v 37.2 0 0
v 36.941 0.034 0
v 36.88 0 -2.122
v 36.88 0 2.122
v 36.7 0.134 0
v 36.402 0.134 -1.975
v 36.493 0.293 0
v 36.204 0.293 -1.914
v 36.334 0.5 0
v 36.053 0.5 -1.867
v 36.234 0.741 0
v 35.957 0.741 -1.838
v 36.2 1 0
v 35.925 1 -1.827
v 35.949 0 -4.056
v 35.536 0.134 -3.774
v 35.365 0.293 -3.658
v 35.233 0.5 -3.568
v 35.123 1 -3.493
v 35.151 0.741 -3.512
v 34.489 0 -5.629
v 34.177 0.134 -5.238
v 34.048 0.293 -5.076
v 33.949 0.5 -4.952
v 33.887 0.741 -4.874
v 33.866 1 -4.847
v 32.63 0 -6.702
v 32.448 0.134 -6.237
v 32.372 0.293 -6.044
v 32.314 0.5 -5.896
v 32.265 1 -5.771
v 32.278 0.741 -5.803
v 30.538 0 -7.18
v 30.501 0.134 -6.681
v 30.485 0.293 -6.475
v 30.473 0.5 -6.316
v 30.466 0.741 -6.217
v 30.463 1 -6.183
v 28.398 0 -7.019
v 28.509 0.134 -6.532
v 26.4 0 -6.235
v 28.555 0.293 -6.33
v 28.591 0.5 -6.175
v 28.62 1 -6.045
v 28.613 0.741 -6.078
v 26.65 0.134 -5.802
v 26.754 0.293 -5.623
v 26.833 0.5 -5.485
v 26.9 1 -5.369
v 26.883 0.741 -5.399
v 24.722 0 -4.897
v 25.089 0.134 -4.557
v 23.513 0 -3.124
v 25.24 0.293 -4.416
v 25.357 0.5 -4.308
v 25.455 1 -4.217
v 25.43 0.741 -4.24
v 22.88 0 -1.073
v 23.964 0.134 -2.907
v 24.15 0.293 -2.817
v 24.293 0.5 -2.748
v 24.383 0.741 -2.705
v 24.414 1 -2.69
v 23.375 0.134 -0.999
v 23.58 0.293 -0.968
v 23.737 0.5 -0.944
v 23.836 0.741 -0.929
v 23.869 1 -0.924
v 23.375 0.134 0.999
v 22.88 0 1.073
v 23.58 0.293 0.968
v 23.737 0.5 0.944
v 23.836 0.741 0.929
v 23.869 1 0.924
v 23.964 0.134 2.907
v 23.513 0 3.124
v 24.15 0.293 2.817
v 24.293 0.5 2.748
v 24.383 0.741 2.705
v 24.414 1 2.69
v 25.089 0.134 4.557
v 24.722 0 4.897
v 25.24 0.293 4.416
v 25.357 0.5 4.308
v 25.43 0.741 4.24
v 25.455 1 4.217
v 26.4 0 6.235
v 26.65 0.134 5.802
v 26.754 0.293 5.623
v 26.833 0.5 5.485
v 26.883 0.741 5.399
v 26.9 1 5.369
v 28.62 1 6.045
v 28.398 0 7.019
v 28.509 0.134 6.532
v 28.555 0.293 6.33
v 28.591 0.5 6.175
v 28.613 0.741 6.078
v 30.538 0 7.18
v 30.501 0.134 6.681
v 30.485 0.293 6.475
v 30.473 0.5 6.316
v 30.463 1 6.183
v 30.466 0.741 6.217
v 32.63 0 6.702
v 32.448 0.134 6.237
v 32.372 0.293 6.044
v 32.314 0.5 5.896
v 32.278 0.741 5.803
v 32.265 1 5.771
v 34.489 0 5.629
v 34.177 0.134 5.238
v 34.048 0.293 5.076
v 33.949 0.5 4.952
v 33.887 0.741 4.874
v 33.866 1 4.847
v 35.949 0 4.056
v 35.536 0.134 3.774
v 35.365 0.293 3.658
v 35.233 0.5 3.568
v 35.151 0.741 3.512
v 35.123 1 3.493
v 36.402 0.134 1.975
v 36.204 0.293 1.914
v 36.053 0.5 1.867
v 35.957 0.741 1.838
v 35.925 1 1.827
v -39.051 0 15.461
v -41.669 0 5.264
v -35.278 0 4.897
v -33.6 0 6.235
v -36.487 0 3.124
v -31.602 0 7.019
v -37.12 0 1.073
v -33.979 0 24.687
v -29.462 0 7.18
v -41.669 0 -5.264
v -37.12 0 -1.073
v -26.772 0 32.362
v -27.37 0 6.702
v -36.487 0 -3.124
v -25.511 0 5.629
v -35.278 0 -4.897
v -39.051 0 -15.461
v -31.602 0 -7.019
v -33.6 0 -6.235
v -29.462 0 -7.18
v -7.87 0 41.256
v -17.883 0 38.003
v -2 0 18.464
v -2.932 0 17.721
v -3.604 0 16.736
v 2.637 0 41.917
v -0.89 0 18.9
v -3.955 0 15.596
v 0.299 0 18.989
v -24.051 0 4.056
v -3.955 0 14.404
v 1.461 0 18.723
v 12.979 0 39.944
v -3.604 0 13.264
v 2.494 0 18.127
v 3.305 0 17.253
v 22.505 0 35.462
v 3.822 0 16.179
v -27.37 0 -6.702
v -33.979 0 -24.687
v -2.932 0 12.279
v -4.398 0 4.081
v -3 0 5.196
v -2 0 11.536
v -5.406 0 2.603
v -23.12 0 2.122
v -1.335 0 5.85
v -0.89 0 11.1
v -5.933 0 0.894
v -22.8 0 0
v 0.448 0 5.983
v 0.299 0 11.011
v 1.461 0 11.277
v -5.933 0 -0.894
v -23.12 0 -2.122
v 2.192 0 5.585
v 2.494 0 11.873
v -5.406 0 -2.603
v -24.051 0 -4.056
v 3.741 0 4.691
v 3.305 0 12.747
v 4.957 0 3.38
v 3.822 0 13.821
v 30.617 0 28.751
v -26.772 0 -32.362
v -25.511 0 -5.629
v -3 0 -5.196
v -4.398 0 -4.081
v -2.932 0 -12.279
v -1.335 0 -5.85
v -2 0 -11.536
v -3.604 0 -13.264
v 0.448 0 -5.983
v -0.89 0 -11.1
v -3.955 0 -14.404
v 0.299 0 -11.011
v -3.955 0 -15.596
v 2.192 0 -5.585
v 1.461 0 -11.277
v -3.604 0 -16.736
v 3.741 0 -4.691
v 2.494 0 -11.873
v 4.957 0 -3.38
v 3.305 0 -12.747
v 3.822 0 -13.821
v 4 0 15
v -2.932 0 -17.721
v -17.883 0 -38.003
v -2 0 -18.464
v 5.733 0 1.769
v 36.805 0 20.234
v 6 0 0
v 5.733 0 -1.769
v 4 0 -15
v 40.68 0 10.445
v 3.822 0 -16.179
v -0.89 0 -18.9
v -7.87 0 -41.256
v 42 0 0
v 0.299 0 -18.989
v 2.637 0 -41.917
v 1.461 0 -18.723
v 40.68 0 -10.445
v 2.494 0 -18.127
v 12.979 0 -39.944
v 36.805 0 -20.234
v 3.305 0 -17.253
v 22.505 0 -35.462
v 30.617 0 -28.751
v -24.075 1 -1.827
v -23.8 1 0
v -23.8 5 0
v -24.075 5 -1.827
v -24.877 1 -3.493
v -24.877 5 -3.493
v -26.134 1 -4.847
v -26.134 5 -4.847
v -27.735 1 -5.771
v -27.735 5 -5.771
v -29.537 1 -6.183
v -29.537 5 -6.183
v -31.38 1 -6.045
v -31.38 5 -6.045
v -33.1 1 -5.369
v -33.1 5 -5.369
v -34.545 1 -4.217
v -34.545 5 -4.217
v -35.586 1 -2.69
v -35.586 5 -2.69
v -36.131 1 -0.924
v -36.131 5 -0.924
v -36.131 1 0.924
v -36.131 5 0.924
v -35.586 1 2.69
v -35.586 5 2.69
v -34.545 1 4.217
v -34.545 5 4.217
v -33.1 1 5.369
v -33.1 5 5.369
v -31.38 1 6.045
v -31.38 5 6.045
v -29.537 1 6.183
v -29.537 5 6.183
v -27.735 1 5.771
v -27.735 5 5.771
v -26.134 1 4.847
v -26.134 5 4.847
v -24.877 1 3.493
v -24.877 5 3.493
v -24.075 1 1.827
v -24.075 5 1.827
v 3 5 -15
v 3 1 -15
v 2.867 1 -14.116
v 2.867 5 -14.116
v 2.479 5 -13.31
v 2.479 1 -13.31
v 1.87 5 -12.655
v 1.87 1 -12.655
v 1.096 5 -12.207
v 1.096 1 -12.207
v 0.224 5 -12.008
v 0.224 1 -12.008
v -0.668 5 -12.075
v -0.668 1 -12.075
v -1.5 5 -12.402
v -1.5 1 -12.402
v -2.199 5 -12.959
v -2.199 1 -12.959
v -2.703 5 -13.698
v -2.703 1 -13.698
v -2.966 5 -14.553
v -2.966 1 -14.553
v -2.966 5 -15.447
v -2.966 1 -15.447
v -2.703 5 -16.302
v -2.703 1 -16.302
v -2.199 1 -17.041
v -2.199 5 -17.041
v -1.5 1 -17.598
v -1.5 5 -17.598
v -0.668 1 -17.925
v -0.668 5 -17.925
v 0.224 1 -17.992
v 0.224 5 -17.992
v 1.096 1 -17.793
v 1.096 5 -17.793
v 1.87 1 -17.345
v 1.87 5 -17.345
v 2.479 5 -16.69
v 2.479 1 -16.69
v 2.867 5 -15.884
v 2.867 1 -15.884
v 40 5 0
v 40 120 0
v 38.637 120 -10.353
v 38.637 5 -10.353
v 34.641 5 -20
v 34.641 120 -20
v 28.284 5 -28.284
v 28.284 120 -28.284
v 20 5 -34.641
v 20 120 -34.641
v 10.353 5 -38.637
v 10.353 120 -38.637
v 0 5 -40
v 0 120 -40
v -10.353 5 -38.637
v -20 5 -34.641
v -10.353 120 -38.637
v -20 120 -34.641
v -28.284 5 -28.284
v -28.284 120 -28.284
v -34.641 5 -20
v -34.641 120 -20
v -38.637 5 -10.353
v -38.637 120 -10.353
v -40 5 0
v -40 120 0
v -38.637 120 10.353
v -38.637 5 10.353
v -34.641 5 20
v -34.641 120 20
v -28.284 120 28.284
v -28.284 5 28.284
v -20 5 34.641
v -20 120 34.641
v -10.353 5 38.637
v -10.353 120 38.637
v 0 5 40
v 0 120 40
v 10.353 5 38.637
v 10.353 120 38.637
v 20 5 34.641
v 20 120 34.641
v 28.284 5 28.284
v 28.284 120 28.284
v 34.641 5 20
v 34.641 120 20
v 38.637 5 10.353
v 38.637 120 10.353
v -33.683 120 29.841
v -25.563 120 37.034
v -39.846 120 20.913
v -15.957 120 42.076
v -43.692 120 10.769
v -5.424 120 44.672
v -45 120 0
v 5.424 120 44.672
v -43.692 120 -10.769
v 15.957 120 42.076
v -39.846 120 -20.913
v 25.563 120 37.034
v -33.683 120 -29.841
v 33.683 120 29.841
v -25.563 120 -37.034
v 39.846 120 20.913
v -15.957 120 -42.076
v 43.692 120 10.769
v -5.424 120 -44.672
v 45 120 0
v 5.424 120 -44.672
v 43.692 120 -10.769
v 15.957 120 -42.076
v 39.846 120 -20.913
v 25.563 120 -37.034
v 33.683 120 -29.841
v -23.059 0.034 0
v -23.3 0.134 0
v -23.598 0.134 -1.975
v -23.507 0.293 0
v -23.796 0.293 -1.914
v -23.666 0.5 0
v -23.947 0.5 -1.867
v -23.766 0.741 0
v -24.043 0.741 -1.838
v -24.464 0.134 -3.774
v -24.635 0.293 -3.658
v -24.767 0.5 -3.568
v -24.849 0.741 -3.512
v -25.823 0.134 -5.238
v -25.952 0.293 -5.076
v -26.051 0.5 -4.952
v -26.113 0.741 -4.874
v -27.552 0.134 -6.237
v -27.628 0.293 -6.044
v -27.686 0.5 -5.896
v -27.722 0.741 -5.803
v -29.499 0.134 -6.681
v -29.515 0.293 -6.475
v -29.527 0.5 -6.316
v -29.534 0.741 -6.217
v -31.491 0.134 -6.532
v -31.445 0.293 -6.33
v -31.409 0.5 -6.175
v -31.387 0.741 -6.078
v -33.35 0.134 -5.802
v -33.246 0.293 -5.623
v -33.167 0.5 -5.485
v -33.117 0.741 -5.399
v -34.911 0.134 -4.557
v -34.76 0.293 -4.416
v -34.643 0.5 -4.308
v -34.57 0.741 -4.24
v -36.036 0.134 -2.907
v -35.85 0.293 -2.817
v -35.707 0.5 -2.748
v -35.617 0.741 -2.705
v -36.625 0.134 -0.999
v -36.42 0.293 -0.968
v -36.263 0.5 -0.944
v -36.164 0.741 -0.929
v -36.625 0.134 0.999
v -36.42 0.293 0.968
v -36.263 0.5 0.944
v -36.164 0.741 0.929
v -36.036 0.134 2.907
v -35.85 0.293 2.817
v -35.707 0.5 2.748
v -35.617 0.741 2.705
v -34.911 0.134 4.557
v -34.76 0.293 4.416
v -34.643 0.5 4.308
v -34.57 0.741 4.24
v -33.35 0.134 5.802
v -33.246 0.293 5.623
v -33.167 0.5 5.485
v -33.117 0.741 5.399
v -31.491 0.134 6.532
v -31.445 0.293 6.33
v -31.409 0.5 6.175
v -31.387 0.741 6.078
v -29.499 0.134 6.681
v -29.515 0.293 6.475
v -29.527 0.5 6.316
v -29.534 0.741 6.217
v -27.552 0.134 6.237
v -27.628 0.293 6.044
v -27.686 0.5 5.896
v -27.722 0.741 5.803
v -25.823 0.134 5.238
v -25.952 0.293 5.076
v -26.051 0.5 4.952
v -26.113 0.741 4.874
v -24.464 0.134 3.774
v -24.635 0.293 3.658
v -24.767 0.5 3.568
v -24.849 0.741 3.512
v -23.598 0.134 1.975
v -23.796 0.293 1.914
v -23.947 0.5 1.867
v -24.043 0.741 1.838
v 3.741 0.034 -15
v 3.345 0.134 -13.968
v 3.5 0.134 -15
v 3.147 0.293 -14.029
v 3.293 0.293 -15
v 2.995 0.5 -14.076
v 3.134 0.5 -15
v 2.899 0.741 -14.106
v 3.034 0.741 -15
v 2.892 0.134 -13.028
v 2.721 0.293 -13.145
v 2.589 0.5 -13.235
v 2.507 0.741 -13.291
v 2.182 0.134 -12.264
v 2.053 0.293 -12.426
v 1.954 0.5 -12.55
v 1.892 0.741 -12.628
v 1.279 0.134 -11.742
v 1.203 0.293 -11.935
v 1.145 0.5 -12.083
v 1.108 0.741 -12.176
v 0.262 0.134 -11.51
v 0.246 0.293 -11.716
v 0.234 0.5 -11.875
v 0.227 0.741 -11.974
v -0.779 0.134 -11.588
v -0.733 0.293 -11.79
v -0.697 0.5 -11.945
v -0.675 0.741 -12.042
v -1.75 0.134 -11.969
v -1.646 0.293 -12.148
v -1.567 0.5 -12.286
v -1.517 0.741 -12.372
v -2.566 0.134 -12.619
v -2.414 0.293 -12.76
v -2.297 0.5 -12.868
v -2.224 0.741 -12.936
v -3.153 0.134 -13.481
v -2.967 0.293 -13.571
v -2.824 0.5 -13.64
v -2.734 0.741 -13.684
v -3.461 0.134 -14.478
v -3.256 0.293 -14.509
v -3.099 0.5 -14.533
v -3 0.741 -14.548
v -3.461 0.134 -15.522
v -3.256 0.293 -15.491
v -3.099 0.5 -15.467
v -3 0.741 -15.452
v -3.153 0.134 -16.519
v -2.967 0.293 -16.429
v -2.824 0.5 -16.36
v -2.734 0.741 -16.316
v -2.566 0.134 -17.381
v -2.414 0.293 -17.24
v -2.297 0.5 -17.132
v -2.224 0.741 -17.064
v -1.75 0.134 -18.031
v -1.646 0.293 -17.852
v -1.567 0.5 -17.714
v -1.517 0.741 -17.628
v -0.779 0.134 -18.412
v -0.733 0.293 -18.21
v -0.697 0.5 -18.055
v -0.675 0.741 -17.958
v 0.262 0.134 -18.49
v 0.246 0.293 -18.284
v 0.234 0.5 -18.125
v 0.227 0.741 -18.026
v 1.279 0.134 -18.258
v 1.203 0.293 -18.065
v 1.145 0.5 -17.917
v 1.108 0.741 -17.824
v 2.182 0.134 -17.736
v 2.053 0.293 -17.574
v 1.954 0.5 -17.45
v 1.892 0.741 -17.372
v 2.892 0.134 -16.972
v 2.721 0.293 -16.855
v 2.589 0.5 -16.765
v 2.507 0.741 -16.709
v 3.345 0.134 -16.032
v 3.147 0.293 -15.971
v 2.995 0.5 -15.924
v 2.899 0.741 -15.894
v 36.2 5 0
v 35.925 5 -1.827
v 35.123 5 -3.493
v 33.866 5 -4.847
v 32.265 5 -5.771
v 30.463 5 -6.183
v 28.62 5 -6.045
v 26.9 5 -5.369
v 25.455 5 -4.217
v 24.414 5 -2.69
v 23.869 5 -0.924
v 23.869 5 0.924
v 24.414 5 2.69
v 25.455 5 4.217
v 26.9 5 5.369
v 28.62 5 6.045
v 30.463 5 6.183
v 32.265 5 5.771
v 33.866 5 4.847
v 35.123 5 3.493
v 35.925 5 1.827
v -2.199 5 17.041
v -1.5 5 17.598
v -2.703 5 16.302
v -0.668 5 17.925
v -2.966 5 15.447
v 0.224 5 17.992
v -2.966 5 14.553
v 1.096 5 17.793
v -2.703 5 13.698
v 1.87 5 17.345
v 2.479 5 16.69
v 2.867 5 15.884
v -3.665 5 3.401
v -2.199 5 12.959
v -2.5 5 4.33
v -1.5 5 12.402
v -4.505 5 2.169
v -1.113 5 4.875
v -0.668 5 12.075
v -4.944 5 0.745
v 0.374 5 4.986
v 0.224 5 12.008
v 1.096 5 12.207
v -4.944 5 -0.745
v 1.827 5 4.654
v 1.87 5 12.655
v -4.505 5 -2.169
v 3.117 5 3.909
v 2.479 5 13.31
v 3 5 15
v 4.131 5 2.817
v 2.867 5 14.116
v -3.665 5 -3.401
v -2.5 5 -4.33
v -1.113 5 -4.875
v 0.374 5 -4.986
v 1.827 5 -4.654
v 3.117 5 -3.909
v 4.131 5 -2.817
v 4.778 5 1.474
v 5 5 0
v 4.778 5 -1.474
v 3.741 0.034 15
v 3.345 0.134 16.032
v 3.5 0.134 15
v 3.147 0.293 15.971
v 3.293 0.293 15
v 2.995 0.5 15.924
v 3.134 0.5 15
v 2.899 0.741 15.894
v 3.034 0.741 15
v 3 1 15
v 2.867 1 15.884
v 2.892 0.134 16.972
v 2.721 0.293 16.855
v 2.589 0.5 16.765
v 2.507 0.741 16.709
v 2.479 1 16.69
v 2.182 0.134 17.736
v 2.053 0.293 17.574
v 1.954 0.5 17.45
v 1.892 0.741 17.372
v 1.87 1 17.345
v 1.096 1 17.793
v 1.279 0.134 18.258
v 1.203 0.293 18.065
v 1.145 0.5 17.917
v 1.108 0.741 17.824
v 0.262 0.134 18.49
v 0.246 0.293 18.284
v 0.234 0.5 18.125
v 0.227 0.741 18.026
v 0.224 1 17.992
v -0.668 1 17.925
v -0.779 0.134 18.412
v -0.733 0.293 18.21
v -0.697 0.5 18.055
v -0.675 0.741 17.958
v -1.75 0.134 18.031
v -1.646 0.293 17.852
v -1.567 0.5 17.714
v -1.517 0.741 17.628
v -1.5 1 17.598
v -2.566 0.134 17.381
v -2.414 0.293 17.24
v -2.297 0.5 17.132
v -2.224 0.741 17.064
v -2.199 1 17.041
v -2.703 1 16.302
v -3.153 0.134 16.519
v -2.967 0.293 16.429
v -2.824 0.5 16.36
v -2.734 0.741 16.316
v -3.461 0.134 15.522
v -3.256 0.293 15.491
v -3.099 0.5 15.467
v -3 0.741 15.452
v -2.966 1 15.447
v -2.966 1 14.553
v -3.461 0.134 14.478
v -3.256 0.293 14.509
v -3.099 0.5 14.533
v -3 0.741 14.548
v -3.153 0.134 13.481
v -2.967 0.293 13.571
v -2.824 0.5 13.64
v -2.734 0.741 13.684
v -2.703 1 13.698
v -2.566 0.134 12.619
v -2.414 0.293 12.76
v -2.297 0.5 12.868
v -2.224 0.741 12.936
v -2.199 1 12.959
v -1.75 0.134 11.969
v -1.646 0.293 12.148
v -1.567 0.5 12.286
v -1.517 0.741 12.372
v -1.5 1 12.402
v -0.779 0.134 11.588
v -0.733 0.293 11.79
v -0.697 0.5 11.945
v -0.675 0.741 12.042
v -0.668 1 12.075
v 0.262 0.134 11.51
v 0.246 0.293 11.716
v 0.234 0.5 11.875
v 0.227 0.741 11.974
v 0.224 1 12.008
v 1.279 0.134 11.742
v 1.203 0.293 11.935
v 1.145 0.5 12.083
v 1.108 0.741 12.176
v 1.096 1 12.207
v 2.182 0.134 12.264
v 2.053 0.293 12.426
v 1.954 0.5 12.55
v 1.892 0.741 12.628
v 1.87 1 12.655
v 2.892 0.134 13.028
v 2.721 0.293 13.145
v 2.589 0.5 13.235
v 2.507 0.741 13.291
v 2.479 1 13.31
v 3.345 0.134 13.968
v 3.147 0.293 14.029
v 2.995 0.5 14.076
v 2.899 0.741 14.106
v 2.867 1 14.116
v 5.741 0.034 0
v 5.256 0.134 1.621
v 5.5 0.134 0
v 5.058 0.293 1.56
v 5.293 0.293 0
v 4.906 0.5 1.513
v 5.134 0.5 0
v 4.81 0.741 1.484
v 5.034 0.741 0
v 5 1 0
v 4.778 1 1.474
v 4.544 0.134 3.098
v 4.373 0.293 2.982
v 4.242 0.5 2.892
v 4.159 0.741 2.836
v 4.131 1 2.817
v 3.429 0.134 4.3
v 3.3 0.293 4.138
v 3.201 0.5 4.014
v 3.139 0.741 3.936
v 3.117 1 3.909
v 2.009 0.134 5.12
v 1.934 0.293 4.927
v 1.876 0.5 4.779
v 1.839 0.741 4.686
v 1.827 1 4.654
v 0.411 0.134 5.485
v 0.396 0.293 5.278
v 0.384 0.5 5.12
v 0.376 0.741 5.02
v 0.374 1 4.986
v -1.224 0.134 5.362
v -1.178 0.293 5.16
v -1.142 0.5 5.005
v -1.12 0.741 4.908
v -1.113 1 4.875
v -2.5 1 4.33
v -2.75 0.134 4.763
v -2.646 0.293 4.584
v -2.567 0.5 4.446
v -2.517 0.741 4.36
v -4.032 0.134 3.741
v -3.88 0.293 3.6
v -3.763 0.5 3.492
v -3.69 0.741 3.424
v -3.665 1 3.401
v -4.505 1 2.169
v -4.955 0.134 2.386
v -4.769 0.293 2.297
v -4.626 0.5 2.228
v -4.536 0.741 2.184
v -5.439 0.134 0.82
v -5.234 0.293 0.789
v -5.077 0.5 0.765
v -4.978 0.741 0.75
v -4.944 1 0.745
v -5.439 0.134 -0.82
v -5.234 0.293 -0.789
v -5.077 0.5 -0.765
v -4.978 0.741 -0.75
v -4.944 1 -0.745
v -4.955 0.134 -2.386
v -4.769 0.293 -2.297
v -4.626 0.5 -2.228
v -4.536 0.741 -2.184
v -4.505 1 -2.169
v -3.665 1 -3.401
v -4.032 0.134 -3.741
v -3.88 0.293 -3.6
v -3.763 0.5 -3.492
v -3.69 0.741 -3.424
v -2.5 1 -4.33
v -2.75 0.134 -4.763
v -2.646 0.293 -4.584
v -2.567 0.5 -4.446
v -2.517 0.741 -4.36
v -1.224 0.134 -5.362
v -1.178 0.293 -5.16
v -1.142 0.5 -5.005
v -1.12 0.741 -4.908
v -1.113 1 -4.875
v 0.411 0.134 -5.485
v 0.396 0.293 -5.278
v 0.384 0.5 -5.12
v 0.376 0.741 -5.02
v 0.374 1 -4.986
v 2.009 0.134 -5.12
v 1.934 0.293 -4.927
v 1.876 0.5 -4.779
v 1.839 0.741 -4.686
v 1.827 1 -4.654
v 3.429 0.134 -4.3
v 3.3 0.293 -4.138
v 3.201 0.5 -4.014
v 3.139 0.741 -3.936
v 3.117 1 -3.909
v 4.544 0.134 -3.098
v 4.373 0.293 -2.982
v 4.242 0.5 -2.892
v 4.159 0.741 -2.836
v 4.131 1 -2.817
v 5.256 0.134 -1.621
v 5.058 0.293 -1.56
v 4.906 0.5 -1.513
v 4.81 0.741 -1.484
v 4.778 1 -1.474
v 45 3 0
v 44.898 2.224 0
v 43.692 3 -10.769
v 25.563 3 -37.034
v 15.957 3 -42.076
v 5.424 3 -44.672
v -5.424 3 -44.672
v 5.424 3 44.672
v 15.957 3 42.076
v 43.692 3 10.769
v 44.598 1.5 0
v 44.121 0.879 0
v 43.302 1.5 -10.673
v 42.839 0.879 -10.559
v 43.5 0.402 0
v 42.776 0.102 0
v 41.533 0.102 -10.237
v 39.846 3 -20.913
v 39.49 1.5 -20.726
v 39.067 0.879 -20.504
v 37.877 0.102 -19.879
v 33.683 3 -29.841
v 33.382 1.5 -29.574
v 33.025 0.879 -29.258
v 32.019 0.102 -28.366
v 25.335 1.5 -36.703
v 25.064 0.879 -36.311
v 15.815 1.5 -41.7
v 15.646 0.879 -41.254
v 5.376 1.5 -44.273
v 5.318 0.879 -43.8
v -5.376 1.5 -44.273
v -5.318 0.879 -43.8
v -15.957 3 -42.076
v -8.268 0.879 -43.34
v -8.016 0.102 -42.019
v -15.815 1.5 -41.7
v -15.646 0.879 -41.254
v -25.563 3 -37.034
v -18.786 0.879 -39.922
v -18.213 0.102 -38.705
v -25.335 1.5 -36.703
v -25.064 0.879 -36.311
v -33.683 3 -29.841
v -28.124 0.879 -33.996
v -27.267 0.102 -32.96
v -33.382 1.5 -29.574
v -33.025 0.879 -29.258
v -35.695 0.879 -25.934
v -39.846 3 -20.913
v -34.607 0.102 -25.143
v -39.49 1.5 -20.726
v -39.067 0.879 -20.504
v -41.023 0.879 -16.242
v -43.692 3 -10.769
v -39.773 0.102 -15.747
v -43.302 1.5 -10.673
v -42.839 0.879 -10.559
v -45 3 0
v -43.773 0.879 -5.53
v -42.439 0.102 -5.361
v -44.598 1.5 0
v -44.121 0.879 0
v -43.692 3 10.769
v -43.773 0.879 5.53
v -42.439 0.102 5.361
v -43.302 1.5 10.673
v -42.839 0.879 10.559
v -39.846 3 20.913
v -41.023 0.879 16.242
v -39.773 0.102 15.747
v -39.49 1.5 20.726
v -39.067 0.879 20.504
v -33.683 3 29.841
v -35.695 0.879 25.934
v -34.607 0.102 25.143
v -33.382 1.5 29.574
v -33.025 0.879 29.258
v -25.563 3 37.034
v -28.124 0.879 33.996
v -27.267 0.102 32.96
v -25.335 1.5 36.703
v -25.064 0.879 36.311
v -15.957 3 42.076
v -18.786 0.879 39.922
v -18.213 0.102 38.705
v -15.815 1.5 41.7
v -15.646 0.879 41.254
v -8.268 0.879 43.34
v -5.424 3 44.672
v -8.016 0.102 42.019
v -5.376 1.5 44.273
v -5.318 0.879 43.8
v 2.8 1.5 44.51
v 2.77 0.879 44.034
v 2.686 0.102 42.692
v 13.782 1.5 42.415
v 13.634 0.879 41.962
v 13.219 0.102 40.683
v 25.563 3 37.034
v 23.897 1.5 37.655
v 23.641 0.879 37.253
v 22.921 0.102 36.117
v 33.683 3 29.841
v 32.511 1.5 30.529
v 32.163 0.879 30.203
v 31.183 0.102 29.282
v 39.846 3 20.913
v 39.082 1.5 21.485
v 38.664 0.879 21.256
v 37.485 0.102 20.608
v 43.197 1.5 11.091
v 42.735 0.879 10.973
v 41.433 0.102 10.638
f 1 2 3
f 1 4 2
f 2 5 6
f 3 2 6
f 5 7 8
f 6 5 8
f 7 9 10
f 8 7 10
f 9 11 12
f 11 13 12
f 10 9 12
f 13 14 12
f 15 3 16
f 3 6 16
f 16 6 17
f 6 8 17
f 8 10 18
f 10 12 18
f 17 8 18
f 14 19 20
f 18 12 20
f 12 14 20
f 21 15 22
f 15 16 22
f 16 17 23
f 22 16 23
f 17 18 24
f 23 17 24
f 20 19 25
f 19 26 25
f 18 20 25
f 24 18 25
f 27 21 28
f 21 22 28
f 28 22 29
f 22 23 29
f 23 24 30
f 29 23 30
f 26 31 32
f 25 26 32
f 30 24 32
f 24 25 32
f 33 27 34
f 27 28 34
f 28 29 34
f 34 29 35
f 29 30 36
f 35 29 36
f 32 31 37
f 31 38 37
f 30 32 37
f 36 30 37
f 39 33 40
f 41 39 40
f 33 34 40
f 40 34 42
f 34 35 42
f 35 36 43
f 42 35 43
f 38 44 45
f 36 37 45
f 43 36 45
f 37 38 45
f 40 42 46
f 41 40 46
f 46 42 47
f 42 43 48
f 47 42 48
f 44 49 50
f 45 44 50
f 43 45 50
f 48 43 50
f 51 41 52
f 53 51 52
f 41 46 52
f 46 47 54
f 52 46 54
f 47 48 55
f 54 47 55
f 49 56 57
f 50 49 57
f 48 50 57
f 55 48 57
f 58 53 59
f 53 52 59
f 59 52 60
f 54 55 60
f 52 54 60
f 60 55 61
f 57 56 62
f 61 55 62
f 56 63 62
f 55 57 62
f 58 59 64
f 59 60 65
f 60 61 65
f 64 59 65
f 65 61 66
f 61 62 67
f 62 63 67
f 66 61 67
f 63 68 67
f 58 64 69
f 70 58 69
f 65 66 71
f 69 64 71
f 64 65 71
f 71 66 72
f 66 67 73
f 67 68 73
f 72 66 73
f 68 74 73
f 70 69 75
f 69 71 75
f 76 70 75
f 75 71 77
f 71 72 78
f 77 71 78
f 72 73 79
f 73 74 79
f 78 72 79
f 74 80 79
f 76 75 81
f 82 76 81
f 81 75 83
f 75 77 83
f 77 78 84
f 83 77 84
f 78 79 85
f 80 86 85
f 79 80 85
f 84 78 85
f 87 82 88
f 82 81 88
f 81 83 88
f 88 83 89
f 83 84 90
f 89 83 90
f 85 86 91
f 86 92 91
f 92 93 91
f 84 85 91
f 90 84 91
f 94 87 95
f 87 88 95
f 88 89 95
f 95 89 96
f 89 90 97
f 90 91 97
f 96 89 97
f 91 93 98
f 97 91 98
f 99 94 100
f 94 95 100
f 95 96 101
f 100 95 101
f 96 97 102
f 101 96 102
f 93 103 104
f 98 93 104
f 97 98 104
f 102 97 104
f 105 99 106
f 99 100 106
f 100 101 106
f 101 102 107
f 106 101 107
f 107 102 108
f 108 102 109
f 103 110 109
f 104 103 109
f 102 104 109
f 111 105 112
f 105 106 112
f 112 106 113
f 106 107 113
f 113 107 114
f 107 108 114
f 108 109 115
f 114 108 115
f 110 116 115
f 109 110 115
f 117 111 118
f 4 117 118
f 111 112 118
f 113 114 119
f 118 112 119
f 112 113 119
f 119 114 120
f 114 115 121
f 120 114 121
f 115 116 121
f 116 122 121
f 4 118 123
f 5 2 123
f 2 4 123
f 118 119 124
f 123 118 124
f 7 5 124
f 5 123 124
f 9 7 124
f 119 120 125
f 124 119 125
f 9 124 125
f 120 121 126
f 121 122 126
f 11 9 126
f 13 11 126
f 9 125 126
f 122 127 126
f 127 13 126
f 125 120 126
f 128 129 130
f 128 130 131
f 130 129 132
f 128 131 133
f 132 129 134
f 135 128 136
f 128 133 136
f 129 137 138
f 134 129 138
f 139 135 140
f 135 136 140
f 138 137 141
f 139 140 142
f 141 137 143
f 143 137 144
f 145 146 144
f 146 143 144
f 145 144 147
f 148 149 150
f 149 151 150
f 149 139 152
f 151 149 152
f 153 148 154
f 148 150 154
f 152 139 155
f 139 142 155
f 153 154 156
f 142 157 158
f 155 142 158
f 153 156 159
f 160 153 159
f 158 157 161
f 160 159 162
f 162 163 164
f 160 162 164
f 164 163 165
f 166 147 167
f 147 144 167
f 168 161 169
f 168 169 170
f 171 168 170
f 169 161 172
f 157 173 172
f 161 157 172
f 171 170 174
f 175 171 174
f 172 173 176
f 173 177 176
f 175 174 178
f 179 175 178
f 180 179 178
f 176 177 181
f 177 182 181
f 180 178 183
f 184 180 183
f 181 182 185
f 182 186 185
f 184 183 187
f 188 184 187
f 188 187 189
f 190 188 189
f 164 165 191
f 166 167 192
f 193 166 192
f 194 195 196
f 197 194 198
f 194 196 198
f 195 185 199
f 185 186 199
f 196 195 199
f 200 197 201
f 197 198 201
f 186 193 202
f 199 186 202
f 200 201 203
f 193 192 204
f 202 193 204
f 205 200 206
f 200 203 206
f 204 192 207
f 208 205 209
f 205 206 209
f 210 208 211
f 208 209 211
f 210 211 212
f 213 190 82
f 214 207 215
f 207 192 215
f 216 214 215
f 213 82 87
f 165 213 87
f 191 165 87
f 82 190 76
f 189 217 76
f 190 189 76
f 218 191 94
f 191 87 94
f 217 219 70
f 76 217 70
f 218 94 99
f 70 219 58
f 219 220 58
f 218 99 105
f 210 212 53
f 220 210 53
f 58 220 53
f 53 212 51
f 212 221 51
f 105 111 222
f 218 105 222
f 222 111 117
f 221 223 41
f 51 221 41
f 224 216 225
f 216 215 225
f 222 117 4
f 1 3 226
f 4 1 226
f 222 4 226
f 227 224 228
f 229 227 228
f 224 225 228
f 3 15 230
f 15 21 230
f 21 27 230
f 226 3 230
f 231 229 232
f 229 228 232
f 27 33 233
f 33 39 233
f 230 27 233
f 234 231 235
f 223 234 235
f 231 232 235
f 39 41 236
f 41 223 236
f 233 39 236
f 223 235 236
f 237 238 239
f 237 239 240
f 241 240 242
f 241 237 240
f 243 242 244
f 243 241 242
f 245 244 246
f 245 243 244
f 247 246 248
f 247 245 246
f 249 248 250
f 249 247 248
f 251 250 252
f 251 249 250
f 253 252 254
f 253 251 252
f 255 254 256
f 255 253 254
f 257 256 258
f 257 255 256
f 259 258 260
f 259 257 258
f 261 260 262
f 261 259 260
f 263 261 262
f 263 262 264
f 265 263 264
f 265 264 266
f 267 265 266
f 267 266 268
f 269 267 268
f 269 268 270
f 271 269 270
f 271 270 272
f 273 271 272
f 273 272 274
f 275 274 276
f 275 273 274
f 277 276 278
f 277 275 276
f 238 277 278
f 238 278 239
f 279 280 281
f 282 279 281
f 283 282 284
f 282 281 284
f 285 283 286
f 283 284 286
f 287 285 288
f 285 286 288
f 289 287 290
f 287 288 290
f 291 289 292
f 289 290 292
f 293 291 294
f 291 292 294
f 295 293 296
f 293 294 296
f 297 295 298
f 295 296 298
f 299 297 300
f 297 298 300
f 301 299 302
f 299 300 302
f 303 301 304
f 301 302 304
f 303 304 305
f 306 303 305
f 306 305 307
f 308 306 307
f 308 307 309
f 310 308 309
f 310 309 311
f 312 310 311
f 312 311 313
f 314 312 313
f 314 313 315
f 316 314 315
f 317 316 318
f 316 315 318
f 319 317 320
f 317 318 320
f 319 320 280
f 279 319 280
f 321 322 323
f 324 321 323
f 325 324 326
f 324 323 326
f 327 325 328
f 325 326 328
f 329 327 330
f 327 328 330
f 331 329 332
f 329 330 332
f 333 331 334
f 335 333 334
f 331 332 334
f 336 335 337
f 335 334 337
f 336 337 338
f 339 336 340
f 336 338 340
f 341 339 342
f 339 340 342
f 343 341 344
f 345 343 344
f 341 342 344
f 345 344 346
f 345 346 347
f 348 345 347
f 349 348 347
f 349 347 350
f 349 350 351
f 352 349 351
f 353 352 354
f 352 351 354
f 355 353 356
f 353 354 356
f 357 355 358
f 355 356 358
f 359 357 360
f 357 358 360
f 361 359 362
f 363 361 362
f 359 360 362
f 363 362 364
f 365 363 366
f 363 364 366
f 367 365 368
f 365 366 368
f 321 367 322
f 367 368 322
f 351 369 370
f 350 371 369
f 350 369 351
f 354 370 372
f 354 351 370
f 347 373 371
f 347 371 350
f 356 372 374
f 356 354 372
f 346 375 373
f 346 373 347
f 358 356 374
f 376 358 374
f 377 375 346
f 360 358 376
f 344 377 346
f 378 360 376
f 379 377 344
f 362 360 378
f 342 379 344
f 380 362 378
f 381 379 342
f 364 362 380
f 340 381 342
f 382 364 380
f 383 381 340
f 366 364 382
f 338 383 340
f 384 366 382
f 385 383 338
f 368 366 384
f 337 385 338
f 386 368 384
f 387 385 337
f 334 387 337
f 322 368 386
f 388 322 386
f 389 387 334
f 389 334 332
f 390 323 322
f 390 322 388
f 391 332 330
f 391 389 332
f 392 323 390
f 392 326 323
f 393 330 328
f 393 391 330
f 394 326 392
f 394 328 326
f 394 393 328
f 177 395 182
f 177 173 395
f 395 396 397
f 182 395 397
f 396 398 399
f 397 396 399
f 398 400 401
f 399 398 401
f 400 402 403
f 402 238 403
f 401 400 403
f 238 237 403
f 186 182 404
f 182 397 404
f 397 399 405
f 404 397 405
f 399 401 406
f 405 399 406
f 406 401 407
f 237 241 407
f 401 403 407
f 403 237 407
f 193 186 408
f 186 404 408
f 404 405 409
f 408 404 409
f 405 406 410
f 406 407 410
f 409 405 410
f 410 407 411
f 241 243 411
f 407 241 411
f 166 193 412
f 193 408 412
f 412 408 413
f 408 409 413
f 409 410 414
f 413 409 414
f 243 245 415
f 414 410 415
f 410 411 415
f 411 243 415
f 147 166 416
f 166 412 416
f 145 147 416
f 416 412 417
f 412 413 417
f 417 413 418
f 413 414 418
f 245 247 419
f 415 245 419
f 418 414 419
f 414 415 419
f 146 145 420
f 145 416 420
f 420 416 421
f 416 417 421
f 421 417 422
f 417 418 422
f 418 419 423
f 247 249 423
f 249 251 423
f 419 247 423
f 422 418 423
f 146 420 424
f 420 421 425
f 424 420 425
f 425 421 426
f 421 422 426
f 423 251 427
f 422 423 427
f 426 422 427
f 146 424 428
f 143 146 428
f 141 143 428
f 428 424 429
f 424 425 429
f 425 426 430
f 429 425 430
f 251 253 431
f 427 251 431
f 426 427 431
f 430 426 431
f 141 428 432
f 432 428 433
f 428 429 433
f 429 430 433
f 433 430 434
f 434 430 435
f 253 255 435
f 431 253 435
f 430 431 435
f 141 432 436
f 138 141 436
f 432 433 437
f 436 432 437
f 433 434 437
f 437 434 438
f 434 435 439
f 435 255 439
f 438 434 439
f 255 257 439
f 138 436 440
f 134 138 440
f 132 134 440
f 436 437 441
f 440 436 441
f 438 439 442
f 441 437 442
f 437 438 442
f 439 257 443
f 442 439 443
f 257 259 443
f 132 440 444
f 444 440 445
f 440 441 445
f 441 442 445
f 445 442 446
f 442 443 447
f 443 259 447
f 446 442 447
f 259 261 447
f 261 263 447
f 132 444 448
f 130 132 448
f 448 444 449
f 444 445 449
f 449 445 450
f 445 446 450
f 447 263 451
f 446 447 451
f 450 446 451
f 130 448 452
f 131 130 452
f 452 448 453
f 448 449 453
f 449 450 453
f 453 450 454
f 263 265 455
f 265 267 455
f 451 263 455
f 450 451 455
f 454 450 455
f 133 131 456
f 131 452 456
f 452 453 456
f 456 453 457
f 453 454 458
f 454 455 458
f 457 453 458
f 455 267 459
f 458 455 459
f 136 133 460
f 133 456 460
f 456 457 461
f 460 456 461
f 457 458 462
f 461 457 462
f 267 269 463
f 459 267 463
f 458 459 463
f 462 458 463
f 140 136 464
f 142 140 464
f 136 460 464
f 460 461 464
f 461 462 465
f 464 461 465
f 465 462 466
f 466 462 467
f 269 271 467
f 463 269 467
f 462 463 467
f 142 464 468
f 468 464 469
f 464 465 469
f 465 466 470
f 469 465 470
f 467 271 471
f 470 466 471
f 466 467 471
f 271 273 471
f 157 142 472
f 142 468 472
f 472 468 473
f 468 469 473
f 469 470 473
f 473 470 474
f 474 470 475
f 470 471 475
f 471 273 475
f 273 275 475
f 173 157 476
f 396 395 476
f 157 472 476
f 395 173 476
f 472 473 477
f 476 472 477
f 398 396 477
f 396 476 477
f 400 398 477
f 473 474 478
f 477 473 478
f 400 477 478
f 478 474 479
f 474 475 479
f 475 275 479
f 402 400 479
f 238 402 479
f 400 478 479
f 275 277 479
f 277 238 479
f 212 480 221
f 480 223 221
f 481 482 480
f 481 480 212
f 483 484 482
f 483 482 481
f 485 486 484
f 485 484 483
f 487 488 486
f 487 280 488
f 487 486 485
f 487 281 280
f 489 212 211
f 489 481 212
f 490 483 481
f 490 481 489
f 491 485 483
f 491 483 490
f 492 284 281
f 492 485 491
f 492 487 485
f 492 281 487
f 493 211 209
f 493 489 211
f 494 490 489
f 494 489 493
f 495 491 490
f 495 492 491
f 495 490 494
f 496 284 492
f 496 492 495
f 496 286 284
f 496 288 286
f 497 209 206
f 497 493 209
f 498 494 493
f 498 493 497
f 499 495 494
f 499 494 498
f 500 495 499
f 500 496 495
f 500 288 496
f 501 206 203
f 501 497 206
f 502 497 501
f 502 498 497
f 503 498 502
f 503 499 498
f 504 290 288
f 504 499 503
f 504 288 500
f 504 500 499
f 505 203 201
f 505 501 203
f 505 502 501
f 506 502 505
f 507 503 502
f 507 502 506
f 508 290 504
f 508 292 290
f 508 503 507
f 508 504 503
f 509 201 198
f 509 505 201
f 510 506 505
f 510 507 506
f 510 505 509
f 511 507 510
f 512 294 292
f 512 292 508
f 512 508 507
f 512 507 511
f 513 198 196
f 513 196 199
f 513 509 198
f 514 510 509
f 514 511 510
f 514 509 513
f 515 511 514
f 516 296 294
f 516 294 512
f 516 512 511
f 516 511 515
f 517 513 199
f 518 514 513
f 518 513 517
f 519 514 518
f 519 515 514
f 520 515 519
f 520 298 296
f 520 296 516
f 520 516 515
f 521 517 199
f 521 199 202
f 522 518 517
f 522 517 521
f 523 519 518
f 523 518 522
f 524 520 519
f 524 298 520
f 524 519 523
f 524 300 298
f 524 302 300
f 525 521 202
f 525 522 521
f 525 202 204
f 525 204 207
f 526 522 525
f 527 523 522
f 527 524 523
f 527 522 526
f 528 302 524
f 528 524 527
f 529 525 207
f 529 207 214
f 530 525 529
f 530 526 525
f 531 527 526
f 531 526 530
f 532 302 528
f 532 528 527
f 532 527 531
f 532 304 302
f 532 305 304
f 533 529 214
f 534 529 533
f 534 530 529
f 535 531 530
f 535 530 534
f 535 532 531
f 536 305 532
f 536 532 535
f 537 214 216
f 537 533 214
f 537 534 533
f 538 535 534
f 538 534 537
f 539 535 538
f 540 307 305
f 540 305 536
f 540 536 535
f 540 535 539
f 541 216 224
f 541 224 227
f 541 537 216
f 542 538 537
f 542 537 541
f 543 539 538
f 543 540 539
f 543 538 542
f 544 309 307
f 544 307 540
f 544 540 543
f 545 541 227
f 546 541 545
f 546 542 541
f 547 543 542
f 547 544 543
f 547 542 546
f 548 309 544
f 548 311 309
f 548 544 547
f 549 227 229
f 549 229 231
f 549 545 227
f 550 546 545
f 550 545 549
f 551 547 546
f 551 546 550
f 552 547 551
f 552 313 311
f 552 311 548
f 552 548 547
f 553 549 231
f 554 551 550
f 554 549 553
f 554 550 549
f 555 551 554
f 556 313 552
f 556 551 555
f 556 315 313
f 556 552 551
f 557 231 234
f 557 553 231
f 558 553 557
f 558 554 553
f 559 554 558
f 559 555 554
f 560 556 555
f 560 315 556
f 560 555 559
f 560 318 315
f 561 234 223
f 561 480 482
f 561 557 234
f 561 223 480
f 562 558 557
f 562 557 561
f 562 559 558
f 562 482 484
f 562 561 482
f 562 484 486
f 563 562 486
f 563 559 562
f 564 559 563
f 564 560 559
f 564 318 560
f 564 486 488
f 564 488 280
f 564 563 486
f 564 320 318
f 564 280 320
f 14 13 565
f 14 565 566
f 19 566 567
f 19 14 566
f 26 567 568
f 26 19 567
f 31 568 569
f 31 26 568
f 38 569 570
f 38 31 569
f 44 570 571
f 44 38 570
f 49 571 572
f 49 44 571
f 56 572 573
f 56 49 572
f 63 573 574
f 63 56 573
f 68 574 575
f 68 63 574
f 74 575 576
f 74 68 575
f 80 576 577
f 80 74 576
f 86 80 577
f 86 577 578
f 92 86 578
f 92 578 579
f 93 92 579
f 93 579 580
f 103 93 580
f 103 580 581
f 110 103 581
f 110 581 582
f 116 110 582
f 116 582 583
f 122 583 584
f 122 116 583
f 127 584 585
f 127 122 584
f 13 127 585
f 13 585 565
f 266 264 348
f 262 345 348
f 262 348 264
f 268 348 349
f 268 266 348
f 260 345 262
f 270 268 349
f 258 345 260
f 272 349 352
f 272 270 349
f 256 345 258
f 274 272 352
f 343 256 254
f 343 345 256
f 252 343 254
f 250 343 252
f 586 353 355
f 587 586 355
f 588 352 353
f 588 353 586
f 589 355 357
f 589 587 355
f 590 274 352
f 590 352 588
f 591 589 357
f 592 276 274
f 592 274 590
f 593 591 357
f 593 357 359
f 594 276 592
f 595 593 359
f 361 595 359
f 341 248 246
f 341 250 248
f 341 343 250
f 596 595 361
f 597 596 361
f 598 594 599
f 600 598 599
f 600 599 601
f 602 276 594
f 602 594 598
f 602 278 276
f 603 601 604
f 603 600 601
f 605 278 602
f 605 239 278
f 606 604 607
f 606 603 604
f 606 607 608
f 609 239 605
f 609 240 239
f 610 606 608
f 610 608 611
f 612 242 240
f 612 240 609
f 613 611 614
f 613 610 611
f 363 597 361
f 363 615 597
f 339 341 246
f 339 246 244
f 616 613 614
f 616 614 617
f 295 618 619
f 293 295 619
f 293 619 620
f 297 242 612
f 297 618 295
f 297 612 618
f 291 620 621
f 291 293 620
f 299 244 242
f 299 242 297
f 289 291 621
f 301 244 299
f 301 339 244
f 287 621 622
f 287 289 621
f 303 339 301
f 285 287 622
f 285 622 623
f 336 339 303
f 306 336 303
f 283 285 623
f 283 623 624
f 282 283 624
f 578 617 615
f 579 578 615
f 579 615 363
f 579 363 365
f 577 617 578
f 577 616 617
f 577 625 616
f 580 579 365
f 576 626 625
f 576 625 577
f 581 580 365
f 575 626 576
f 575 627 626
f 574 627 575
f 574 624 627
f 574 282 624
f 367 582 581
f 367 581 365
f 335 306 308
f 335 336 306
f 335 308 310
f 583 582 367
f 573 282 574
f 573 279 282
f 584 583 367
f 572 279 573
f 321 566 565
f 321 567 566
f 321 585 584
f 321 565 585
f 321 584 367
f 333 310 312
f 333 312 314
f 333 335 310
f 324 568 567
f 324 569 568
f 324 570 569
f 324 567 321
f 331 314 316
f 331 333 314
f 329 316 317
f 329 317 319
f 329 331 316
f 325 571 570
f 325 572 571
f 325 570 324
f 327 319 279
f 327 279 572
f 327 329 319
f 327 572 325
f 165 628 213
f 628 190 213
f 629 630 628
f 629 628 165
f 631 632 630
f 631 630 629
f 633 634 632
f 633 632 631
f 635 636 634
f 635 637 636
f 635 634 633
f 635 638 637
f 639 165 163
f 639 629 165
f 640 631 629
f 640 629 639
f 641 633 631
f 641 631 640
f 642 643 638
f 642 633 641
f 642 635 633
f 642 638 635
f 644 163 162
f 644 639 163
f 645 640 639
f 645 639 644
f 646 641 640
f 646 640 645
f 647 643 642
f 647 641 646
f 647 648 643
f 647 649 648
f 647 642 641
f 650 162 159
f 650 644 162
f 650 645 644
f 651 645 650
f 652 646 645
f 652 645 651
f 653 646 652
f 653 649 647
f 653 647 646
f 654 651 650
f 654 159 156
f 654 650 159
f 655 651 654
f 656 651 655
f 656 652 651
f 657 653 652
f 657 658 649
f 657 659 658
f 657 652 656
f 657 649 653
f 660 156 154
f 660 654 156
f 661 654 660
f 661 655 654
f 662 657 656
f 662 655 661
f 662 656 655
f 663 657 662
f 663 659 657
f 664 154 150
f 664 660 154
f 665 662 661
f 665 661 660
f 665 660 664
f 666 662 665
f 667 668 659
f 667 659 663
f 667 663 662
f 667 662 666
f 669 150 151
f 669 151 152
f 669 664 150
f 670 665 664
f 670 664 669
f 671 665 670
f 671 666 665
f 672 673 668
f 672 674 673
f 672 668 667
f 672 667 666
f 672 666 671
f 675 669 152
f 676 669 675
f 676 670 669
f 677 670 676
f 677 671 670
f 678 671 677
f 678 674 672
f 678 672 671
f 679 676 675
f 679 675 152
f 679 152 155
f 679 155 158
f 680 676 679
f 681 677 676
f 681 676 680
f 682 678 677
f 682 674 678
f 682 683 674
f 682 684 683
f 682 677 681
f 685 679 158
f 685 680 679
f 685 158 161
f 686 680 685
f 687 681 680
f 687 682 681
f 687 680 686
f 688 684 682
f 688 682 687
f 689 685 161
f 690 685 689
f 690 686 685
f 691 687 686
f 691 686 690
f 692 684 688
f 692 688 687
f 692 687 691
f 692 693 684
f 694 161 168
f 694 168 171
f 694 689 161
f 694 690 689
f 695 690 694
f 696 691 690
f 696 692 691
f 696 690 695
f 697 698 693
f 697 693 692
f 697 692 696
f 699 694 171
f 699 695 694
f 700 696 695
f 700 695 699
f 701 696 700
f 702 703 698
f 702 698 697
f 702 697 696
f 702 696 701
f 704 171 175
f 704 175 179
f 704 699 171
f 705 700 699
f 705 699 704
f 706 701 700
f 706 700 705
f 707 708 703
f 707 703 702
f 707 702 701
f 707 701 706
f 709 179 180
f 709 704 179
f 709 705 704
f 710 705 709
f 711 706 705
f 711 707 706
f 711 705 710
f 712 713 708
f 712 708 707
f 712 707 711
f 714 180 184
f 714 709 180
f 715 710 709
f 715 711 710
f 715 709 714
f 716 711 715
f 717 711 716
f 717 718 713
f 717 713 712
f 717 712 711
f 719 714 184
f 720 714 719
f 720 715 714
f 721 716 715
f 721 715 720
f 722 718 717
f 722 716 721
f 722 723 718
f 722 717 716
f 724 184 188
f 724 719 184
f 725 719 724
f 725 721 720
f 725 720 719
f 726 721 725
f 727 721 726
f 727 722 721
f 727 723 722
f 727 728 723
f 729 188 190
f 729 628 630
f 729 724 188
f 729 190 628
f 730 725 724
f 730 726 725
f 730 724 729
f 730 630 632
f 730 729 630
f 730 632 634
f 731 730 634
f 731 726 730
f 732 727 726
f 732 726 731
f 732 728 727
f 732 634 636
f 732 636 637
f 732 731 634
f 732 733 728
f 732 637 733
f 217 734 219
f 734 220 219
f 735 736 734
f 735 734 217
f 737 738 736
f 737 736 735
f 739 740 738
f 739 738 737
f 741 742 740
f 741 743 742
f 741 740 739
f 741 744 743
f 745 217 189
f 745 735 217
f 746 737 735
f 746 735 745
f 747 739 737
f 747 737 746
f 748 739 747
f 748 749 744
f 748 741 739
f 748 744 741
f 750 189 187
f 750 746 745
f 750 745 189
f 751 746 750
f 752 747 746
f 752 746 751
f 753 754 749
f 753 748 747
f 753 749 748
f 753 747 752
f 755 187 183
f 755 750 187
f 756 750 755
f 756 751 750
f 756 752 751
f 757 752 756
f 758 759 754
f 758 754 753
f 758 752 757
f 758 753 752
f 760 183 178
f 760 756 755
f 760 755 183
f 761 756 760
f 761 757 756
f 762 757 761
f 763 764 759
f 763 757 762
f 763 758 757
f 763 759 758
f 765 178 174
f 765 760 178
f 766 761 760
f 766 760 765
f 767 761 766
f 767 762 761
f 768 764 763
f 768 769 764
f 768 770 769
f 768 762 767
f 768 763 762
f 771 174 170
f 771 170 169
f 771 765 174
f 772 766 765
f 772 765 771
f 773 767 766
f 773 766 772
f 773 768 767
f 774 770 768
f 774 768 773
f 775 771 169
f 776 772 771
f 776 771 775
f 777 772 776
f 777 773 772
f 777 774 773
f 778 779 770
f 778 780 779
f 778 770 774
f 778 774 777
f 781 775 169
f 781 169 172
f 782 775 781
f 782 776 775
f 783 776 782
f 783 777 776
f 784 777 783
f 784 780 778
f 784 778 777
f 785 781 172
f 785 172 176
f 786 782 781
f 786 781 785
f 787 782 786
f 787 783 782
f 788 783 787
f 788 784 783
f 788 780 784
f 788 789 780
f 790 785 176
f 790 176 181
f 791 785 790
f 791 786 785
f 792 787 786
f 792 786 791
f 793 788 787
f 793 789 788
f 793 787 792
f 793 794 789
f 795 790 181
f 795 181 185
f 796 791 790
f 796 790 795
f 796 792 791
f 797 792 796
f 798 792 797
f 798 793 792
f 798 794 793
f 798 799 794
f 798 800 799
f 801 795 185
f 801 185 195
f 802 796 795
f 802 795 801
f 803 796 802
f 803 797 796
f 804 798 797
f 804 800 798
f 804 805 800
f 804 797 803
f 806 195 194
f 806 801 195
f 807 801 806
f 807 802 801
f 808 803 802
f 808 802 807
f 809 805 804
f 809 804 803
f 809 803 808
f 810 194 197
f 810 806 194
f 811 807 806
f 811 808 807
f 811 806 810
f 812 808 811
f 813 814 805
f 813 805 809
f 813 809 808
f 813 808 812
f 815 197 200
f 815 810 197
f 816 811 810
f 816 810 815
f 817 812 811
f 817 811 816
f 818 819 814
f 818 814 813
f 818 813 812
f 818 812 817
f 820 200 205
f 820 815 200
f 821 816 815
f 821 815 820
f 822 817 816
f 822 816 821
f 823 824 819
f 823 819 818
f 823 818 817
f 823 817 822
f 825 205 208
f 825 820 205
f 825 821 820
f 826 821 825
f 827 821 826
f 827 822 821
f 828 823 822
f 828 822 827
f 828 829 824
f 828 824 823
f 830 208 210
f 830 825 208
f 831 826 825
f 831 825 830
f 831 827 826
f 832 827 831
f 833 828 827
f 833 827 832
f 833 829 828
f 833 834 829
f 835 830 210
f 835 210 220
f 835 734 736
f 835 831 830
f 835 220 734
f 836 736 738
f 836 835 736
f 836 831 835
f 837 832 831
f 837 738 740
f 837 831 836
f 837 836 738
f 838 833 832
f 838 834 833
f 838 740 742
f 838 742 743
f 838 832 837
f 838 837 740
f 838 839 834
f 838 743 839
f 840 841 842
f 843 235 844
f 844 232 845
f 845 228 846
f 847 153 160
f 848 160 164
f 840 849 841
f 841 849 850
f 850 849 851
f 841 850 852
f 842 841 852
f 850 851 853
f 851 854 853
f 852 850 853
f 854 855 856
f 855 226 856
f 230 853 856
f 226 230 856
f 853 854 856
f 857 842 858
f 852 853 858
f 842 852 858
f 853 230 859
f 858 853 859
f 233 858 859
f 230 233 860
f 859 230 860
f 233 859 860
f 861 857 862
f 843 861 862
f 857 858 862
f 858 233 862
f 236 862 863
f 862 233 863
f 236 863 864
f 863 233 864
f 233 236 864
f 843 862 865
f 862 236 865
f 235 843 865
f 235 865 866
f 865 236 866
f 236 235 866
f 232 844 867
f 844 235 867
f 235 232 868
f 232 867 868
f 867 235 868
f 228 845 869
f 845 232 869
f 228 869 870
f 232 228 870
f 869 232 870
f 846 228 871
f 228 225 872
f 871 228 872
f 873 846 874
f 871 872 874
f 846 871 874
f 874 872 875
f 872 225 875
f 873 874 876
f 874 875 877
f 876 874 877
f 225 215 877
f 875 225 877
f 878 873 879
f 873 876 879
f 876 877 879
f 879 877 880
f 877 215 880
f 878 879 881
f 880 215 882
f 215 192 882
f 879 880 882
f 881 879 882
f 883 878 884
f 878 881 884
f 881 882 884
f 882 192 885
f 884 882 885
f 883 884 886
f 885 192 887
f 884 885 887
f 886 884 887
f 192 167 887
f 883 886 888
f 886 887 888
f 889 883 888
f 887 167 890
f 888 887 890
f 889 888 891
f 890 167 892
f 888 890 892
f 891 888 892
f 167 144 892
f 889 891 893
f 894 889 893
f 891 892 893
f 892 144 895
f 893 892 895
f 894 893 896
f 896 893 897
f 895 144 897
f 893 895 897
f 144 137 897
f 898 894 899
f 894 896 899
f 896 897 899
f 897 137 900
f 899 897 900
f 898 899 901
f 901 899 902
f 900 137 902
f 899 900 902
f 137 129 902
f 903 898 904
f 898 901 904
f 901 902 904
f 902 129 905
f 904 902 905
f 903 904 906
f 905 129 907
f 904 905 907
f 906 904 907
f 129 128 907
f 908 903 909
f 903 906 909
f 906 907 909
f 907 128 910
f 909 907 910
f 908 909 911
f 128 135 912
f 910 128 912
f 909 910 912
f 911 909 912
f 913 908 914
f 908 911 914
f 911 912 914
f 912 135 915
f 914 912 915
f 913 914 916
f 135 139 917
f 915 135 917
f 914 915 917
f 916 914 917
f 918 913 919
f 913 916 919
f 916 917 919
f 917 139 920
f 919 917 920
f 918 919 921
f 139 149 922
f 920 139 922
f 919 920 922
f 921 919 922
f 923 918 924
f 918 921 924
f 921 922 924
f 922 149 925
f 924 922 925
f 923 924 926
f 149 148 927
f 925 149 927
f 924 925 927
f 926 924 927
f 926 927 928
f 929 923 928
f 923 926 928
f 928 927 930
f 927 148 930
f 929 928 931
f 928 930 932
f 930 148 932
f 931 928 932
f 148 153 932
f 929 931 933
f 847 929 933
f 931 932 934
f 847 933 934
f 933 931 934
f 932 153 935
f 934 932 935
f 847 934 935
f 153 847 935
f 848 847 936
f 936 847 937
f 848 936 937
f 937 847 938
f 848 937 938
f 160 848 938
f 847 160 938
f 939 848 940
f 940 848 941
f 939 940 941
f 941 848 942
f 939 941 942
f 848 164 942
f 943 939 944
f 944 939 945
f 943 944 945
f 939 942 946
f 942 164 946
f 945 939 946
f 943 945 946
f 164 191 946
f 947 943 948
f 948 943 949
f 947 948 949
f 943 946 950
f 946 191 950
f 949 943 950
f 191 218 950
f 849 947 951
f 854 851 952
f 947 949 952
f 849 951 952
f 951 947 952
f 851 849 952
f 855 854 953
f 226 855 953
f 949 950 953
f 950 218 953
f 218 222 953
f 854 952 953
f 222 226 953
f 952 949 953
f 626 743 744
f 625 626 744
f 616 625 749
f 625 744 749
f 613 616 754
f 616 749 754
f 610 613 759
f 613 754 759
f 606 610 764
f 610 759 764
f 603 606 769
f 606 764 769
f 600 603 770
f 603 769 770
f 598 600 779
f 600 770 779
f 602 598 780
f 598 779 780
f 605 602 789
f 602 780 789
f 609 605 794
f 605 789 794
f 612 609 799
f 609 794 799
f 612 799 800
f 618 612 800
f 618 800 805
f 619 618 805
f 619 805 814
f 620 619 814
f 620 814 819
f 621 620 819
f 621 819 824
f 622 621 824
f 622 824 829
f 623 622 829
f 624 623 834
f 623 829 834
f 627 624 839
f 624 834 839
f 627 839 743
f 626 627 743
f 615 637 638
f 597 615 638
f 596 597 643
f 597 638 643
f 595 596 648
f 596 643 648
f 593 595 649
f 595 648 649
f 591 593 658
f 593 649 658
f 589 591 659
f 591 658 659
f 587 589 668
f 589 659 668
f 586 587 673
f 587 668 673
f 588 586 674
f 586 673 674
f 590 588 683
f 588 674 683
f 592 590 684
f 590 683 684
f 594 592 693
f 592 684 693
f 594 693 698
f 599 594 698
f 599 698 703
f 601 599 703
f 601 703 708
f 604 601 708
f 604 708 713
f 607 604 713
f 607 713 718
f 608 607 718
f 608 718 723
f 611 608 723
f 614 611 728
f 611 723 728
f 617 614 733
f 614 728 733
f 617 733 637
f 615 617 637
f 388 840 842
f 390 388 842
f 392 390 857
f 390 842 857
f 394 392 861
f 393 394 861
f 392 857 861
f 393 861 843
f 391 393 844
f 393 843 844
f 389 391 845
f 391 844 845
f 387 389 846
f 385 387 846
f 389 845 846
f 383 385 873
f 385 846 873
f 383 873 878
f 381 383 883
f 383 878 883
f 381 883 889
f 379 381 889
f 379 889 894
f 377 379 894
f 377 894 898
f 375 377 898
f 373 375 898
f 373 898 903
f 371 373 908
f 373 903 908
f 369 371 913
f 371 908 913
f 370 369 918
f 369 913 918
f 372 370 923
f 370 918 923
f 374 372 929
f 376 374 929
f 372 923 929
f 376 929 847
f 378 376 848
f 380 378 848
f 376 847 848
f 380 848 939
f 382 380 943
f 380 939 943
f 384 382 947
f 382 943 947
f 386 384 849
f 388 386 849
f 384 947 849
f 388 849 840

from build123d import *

# Parameters (mm, degrees)
SKETCH1_R           = 45
BOSS_EXTRUDE1_DEPTH = 120
SKETCH3_R           = 40
CUT_EXTRUDE1_DEPTH  = 115
SKETCH2_R           = 6.2
CUT_EXTRUDE2_DEPTH  = 5
SKETCH4_R           = 3
CUT_EXTRUDE3_DEPTH  = 5
FILLET1_R           = 3
FILLET2_R           = 1
FILLET3_R           = 1
FILLET4_R           = 1
FILLET5_R           = 1
SKETCH5_R           = 5
CUT_EXTRUDE4_DEPTH  = 5
FILLET6_R           = 1


with BuildPart() as part:
    # Sketch1 → Boss-Extrude1 (new body)
    with BuildSketch(Plane(origin=(0, 0, 0), x_dir=(1, 0, 0), z_dir=(0, 1, 0))):
        Circle(SKETCH1_R)
    extrude(amount=BOSS_EXTRUDE1_DEPTH)

    # Sketch3 → Cut-Extrude1 (cut)
    with BuildSketch(Plane(origin=(0, 120, 0), x_dir=(1, 0, 0), z_dir=(0, 1, 0))):
        Circle(SKETCH3_R)
    extrude(amount=-CUT_EXTRUDE1_DEPTH, mode=Mode.SUBTRACT)

    # Sketch2 → Cut-Extrude2 (cut)
    with BuildSketch(Plane(origin=(0, 0, 0), x_dir=(1, 0, 0), z_dir=(0, 1, 0))):
        with Locations((30, 0)):
            Circle(SKETCH2_R)
        with Locations((-30, 0)):
            Circle(SKETCH2_R)
    extrude(amount=CUT_EXTRUDE2_DEPTH, mode=Mode.SUBTRACT)

    # Sketch4 → Cut-Extrude3 (cut)
    with BuildSketch(Plane.XZ):
        with Locations((0, 15)):
            Circle(SKETCH4_R)
        with Locations((0, -15)):
            Circle(SKETCH4_R)
    extrude(amount=-CUT_EXTRUDE3_DEPTH, mode=Mode.SUBTRACT)

    # Fillet1
    fillet1_edges = [part.edges().sort_by_distance(p)[0] for p in [
        (-45, 0, 0),
    ]]
    fillet(fillet1_edges, radius=FILLET1_R)

    # Fillet2
    fillet2_edges = [part.edges().sort_by_distance(p)[0] for p in [
        (-36.2, 0, 0),
    ]]
    fillet(fillet2_edges, radius=FILLET2_R)

    # Fillet3
    fillet3_edges = [part.edges().sort_by_distance(p)[0] for p in [
        (23.8, 0, 0),
    ]]
    fillet(fillet3_edges, radius=FILLET3_R)

    # Fillet4
    fillet4_edges = [part.edges().sort_by_distance(p)[0] for p in [
        (-3, 0, -15),
    ]]
    fillet(fillet4_edges, radius=FILLET4_R)

    # Fillet5
    fillet5_edges = [part.edges().sort_by_distance(p)[0] for p in [
        (-3, 0, 15),
    ]]
    fillet(fillet5_edges, radius=FILLET5_R)

    # Sketch5 → Cut-Extrude4 (cut)
    with BuildSketch(Plane.XZ):
        Circle(SKETCH5_R)
    extrude(amount=-CUT_EXTRUDE4_DEPTH, mode=Mode.SUBTRACT)

    # Fillet6
    fillet6_edges = [part.edges().sort_by_distance(p)[0] for p in [
        (-5, 0, 0),
    ]]
    fillet(fillet6_edges, radius=FILLET6_R)


solid = part.part
